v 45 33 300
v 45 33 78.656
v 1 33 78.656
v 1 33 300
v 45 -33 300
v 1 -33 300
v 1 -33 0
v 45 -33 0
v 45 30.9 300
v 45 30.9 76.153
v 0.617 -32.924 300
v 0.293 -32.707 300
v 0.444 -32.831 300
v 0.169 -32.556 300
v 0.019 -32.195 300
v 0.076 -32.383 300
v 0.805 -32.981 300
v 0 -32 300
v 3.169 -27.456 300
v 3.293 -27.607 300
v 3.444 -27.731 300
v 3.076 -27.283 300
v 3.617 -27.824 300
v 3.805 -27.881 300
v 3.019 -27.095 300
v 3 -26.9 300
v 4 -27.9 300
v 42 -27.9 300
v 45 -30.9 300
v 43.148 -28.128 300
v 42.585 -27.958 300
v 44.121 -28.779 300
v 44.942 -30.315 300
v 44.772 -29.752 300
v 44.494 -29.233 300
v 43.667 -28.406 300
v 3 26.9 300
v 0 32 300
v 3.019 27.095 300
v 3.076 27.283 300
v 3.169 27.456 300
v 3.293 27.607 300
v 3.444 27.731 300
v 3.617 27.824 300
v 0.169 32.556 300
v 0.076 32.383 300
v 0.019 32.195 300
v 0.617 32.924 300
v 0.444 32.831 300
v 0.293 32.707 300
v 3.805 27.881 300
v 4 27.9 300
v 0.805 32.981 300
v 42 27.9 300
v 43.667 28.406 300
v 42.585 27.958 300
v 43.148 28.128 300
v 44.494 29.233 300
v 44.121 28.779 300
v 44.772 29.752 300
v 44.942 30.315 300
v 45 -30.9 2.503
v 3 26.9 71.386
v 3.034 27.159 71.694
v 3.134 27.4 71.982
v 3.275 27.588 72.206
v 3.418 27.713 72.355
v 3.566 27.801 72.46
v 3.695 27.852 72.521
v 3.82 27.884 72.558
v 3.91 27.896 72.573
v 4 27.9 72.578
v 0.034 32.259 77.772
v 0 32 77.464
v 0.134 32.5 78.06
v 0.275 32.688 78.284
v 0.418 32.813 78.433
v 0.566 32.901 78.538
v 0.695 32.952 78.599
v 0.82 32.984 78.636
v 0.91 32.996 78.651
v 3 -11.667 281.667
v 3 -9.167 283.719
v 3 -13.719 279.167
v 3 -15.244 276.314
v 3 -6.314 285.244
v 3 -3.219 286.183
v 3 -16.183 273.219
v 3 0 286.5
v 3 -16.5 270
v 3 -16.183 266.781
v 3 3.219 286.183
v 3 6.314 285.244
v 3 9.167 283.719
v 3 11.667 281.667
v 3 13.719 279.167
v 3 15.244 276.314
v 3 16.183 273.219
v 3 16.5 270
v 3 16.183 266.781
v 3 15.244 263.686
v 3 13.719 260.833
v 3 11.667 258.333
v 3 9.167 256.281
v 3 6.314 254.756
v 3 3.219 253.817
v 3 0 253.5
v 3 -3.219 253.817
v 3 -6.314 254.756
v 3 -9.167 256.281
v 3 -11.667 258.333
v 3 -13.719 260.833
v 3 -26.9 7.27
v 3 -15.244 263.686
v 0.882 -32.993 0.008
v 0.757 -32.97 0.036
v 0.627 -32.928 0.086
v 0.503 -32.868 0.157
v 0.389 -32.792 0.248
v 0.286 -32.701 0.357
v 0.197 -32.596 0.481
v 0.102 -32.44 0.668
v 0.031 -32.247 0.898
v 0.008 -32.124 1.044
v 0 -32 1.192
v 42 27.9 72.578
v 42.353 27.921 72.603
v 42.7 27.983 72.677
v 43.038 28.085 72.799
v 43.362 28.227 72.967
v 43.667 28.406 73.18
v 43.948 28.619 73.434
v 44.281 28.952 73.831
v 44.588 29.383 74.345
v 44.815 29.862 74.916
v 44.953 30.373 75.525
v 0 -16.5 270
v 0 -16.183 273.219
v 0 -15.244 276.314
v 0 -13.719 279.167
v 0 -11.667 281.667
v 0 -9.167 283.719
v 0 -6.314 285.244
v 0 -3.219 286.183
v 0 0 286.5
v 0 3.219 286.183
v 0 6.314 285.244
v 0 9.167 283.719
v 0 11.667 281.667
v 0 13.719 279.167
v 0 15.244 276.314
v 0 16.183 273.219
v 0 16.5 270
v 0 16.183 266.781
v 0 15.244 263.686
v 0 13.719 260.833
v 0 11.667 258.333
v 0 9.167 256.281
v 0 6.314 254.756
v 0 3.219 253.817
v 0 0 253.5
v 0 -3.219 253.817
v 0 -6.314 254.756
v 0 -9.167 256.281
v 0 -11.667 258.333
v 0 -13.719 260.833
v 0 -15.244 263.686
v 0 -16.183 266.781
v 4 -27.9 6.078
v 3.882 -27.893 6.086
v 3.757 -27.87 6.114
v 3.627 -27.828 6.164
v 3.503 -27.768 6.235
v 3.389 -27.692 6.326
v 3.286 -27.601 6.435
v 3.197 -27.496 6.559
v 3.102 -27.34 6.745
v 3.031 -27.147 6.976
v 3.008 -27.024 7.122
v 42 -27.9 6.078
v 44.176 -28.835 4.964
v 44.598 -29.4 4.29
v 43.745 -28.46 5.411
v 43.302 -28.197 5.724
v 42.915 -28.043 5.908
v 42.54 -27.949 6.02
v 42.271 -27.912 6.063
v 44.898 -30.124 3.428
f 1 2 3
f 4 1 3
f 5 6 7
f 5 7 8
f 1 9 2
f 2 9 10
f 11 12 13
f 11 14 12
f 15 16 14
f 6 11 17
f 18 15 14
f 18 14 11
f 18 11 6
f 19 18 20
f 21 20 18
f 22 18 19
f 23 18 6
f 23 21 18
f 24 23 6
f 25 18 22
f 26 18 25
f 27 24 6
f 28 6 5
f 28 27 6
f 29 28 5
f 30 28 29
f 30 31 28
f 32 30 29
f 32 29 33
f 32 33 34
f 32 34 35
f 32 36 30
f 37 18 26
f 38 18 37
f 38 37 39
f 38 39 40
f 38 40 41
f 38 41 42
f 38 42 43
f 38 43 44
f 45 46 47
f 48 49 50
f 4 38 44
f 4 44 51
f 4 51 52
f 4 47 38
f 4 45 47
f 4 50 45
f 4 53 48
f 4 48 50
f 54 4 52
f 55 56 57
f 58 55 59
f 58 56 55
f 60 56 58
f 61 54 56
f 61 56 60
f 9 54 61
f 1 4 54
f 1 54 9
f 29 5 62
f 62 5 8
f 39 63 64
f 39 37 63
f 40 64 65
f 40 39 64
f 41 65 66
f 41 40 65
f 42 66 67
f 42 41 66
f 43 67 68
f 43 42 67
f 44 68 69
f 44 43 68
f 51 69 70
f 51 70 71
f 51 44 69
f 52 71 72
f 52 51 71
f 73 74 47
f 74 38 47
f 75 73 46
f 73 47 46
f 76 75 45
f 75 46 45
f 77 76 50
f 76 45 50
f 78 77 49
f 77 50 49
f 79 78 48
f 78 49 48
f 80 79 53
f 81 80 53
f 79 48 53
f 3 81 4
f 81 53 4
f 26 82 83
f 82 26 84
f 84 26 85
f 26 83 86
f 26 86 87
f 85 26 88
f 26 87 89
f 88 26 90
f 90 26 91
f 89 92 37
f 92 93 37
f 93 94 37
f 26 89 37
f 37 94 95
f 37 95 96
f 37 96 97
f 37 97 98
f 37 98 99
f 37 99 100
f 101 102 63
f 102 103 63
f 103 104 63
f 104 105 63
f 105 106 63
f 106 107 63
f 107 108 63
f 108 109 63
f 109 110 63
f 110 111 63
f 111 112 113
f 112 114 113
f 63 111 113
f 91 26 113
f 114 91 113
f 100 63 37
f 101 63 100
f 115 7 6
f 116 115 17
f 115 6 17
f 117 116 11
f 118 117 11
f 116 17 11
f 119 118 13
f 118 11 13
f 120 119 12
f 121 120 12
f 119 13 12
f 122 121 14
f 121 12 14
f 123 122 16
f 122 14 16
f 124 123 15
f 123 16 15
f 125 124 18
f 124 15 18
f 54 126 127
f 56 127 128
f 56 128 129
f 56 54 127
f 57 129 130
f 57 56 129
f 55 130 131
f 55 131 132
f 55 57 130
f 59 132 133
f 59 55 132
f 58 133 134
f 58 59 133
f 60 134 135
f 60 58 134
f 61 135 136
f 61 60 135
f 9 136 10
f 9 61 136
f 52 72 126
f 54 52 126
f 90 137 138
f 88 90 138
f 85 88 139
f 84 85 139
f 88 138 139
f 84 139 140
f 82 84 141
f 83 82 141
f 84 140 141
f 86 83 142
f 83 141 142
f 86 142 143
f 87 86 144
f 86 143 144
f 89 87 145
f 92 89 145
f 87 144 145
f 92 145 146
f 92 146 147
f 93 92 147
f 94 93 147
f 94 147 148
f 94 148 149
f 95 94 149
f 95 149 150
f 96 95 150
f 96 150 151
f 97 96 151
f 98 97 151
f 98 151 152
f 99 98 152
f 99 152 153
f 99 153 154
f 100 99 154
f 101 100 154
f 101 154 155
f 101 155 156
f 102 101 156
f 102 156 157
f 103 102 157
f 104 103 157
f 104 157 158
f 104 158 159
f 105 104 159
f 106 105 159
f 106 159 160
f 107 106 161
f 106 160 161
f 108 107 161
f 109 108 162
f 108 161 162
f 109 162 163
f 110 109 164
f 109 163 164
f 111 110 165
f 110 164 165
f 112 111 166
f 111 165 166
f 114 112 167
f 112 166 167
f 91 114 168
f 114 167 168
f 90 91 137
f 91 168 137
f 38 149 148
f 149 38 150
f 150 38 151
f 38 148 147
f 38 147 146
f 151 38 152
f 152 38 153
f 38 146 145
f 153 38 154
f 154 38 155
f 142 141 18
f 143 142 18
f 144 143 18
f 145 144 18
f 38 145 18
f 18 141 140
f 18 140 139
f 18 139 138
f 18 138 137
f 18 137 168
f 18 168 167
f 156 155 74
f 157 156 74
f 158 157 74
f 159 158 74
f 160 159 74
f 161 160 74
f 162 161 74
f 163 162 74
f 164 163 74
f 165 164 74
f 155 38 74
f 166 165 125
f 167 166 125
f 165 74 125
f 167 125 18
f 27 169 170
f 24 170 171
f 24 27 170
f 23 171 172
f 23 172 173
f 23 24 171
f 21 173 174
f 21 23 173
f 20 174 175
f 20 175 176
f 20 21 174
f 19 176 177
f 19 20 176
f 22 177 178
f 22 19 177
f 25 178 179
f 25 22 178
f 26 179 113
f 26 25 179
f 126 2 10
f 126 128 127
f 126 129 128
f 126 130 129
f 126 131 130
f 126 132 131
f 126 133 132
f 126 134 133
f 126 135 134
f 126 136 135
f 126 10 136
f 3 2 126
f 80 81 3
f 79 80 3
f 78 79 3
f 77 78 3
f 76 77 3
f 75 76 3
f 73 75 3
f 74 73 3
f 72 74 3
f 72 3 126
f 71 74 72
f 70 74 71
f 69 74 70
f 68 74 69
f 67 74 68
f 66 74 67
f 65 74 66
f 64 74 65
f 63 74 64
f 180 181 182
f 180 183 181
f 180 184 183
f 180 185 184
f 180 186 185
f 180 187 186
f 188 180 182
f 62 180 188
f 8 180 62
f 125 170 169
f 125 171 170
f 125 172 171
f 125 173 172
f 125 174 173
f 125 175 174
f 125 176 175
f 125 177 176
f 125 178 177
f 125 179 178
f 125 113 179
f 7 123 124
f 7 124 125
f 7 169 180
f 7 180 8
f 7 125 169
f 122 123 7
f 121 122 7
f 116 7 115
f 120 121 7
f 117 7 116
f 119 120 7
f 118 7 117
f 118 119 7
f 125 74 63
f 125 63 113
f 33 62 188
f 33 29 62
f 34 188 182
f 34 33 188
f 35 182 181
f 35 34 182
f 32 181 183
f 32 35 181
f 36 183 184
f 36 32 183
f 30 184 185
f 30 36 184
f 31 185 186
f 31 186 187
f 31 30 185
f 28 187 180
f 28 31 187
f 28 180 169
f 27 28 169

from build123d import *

# Parameters (mm, degrees)
BOSS_EXTRUDE1_DEPTH = 300
CUT_EXTRUDE1_REACH  = 307.146
FILLET1_R           = 3
FILLET2_R           = 1
SKETCH4_R           = 16.5
CUT_EXTRUDE2_DEPTH  = 10


with BuildPart() as part:
    # Sketch1 → Boss-Extrude1 (new body)
    with BuildSketch(Plane.XY):
        Polygon((0, 33), (0, -33), (45, -33), (45, -27.9), (3, -27.9), (3, 27.9), (45, 27.9), (45, 33), align=None)
    extrude(amount=BOSS_EXTRUDE1_DEPTH)

    # Sketch3 → Cut-Extrude1 (cut, up to next)
    with BuildSketch(Plane.ZY, mode=Mode.PRIVATE) as cut_extrude1_sk1:
        Polygon((0, -33), (0, 33), (78.655737111, 33), align=None)
    cut_extrude1_tool1 = extrude(cut_extrude1_sk1.sketch, amount=-CUT_EXTRUDE1_REACH, mode=Mode.PRIVATE) & part.part
    add(cut_extrude1_tool1.solids().sort_by_distance((0, 11, 26.218579))[0], mode=Mode.SUBTRACT)

    # Fillet1
    fillet1_edges = [part.edges().sort_by_distance(p)[0] for p in [
        (45, -27.9, 153.038971661),
        (45, 27.9, 186.288896894),
    ]]
    fillet(fillet1_edges, radius=FILLET1_R)

    # Fillet2
    fillet2_edges = [part.edges().sort_by_distance(p)[0] for p in [
        (3, -27.9, 153.038971661),
        (0, -33, 150),
        (0, 33, 189.327868556),
        (3, 27.9, 186.288896894),
    ]]
    fillet(fillet2_edges, radius=FILLET2_R)

    # Sketch4 → Cut-Extrude2 (cut)
    with BuildSketch(Plane.ZY):
        with Locations(Location((270, 0, 0), (0, 0, 270))):
            Circle(SKETCH4_R)
    extrude(amount=-CUT_EXTRUDE2_DEPTH, mode=Mode.SUBTRACT)


solid = part.part
